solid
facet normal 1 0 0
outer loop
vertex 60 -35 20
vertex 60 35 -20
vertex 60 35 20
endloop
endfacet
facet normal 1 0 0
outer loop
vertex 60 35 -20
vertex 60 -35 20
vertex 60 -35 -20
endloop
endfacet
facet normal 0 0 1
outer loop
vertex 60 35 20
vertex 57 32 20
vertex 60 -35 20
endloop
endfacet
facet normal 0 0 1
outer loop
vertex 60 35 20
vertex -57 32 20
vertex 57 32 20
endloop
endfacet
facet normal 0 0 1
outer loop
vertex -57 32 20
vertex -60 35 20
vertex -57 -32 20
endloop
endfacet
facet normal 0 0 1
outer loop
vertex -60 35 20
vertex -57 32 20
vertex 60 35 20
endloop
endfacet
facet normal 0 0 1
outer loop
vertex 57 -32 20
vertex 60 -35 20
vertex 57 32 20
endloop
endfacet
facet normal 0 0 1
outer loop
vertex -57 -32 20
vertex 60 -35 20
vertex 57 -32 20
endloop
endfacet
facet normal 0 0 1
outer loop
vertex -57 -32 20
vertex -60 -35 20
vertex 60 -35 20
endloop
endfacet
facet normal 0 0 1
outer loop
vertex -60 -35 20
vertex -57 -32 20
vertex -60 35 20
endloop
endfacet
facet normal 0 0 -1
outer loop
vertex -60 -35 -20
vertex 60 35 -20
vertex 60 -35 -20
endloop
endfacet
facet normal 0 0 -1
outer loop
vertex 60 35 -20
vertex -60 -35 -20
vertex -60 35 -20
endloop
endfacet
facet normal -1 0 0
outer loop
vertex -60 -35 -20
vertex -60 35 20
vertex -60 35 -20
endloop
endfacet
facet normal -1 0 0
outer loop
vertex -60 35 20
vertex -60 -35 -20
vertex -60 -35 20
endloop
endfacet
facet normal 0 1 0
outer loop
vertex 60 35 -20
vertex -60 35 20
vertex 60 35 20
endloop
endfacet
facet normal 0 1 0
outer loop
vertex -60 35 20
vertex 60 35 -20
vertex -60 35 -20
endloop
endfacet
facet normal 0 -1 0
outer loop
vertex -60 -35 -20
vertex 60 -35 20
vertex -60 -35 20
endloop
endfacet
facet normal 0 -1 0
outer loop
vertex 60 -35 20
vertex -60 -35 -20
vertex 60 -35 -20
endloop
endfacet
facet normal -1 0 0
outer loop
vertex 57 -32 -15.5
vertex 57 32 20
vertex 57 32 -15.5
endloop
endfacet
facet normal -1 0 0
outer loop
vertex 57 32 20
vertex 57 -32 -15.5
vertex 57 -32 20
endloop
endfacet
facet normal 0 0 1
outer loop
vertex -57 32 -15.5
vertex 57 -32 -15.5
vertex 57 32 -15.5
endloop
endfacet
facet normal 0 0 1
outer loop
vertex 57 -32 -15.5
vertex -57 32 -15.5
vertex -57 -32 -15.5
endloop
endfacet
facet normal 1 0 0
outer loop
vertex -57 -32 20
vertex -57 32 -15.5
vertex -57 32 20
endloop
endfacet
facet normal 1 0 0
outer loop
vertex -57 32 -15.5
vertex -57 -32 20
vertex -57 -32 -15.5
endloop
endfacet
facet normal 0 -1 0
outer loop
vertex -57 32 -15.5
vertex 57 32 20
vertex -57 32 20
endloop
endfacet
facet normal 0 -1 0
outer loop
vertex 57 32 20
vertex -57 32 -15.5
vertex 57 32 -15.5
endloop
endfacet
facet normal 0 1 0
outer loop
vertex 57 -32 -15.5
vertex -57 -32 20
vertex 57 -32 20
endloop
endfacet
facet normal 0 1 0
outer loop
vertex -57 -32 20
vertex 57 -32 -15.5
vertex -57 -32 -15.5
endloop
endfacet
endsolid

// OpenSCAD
// Buffer tank for mini horizontal gel-electrophoresis box
// Dimensions in mm

// Outer dimensions
outer_x = 120;
outer_y = 70;
outer_z = 40;

// Wall and floor thickness
wall_thickness = 3;
floor_thickness = 3;

// Platform dimensions
platform_length = 60;
platform_height_above_inner_floor = 10;
// Platform spans full inner width (Y)

// Electrode hole
hole_diameter = 2;
hole_z = 30;
hole_y = 0;

// Derived dimensions
inner_x = outer_x - 2 * wall_thickness;
inner_y = outer_y - 2 * wall_thickness;

// Platform top Z position relative to global origin
// Floor is at z=0, floor thickness is 3. Inner floor is at z=3.
// Platform top is 10mm above inner floor.
platform_top_z = floor_thickness + platform_height_above_inner_floor; // 13 mm

// Platform half-length in X
platform_half_x = platform_length / 2;

// Hole radius
hole_radius = hole_diameter / 2;

// Extrusion depth for cutting holes (must extend past faces)
cut_depth = 1.0;

// Build the part
difference() {
    // Main tank body (outer shell)
    // Centered on X, Y. Resting on Z=0.
    // To center on X/Y, we translate the cube.
    // Outer X: 0 to 120. Center X: 60.
    // Outer Y: 0 to 70. Center Y: 35.
    // Outer Z: 0 to 40.
    
    // Let's build it directly at the correct position to avoid translation confusion.
    // The prompt says "centre it on the origin in X and Y".
    // So X goes from -60 to 60. Y goes from -35 to 35.
    
    // Re-defining coordinates based on centering at origin (0,0)
    // Outer Box
    translate([0, 0, 0]) {
        cube([outer_x, outer_y, outer_z], center = true);
    }

    // Subtract inner cavity
    // Inner cavity starts at z = floor_thickness (3mm)
    // Inner dimensions:
    // X: -inner_x/2 to inner_x/2
    // Y: -inner_y/2 to inner_y/2
    // Z: floor_thickness to outer_z (open top)
    
    translate([0, 0, floor_thickness]) {
        cube([inner_x, inner_y, outer_z - floor_thickness], center = true);
    }

    // Subtract the platform
    // Platform sits on inner floor (z = floor_thickness)
    // Platform top is at z = platform_top_z (13mm)
    // Platform length is 60mm in X, centered.
    // Platform spans full inner width in Y.
    
    translate([0, 0, floor_thickness]) {
        cube([platform_length, inner_y, platform_top_z - floor_thickness], center = true);
    }

    // Drill electrode holes
    // Hole is at y = 0, z = hole_z (30mm)
    // Hole goes through the end walls.
    // The walls are at X = -outer_x/2 and X = outer_x/2.
    // We need to cut a cylinder through the solid at these locations.
    // However, the hole is "horizontal along X".
    // This implies the hole axis is parallel to X? 
    // "drill a 2 mm diameter horizontal hole along X ... for the electrode wires"
    // Usually, wires come out from the sides. If the hole is "along X", it might mean the hole is oriented in the X direction?
    // No, "along X" usually describes the position or the axis. 
    // If it's a hole *for* wires, and it's in the end wall, the hole axis is perpendicular to the end wall.
    // The end walls are at the X ends. So the hole axis is along X.
    // So we drill a cylinder with its axis parallel to the X-axis.
    
    // Left hole (at X = -outer_x/2)
    // Center of hole in X: -outer_x/2
    // Center of hole in Y: 0
    // Center of hole in Z: 30
    
    // Right hole (at X = outer_x/2)
    // Center of hole in X: outer_x/2
    // Center of hole in Y: 0
    // Center of hole in Z: 30
    
    // We use a cylinder oriented along X.
    // OpenSCAD cylinder is along Z by default. We rotate it.
    
    // Left Hole
    translate([-outer_x / 2, hole_y, hole_z]) {
        $fn = 64;
        rotate([90, 0, 0]) {
            cylinder(
                d = hole_diameter + 0.02, // Slightly larger to ensure cut
                h = outer_x + cut_depth, // Long enough to cut through
                center = true
            );
        }
    }

    // Right Hole
    translate([outer_x / 2, hole_y, hole_z]) {
        $fn = 64;
        rotate([90, 0, 0]) {
            cylinder(
                d = hole_diameter + 0.02,
                h = outer_x + cut_depth,
                center = true
            );
        }
    }
}
